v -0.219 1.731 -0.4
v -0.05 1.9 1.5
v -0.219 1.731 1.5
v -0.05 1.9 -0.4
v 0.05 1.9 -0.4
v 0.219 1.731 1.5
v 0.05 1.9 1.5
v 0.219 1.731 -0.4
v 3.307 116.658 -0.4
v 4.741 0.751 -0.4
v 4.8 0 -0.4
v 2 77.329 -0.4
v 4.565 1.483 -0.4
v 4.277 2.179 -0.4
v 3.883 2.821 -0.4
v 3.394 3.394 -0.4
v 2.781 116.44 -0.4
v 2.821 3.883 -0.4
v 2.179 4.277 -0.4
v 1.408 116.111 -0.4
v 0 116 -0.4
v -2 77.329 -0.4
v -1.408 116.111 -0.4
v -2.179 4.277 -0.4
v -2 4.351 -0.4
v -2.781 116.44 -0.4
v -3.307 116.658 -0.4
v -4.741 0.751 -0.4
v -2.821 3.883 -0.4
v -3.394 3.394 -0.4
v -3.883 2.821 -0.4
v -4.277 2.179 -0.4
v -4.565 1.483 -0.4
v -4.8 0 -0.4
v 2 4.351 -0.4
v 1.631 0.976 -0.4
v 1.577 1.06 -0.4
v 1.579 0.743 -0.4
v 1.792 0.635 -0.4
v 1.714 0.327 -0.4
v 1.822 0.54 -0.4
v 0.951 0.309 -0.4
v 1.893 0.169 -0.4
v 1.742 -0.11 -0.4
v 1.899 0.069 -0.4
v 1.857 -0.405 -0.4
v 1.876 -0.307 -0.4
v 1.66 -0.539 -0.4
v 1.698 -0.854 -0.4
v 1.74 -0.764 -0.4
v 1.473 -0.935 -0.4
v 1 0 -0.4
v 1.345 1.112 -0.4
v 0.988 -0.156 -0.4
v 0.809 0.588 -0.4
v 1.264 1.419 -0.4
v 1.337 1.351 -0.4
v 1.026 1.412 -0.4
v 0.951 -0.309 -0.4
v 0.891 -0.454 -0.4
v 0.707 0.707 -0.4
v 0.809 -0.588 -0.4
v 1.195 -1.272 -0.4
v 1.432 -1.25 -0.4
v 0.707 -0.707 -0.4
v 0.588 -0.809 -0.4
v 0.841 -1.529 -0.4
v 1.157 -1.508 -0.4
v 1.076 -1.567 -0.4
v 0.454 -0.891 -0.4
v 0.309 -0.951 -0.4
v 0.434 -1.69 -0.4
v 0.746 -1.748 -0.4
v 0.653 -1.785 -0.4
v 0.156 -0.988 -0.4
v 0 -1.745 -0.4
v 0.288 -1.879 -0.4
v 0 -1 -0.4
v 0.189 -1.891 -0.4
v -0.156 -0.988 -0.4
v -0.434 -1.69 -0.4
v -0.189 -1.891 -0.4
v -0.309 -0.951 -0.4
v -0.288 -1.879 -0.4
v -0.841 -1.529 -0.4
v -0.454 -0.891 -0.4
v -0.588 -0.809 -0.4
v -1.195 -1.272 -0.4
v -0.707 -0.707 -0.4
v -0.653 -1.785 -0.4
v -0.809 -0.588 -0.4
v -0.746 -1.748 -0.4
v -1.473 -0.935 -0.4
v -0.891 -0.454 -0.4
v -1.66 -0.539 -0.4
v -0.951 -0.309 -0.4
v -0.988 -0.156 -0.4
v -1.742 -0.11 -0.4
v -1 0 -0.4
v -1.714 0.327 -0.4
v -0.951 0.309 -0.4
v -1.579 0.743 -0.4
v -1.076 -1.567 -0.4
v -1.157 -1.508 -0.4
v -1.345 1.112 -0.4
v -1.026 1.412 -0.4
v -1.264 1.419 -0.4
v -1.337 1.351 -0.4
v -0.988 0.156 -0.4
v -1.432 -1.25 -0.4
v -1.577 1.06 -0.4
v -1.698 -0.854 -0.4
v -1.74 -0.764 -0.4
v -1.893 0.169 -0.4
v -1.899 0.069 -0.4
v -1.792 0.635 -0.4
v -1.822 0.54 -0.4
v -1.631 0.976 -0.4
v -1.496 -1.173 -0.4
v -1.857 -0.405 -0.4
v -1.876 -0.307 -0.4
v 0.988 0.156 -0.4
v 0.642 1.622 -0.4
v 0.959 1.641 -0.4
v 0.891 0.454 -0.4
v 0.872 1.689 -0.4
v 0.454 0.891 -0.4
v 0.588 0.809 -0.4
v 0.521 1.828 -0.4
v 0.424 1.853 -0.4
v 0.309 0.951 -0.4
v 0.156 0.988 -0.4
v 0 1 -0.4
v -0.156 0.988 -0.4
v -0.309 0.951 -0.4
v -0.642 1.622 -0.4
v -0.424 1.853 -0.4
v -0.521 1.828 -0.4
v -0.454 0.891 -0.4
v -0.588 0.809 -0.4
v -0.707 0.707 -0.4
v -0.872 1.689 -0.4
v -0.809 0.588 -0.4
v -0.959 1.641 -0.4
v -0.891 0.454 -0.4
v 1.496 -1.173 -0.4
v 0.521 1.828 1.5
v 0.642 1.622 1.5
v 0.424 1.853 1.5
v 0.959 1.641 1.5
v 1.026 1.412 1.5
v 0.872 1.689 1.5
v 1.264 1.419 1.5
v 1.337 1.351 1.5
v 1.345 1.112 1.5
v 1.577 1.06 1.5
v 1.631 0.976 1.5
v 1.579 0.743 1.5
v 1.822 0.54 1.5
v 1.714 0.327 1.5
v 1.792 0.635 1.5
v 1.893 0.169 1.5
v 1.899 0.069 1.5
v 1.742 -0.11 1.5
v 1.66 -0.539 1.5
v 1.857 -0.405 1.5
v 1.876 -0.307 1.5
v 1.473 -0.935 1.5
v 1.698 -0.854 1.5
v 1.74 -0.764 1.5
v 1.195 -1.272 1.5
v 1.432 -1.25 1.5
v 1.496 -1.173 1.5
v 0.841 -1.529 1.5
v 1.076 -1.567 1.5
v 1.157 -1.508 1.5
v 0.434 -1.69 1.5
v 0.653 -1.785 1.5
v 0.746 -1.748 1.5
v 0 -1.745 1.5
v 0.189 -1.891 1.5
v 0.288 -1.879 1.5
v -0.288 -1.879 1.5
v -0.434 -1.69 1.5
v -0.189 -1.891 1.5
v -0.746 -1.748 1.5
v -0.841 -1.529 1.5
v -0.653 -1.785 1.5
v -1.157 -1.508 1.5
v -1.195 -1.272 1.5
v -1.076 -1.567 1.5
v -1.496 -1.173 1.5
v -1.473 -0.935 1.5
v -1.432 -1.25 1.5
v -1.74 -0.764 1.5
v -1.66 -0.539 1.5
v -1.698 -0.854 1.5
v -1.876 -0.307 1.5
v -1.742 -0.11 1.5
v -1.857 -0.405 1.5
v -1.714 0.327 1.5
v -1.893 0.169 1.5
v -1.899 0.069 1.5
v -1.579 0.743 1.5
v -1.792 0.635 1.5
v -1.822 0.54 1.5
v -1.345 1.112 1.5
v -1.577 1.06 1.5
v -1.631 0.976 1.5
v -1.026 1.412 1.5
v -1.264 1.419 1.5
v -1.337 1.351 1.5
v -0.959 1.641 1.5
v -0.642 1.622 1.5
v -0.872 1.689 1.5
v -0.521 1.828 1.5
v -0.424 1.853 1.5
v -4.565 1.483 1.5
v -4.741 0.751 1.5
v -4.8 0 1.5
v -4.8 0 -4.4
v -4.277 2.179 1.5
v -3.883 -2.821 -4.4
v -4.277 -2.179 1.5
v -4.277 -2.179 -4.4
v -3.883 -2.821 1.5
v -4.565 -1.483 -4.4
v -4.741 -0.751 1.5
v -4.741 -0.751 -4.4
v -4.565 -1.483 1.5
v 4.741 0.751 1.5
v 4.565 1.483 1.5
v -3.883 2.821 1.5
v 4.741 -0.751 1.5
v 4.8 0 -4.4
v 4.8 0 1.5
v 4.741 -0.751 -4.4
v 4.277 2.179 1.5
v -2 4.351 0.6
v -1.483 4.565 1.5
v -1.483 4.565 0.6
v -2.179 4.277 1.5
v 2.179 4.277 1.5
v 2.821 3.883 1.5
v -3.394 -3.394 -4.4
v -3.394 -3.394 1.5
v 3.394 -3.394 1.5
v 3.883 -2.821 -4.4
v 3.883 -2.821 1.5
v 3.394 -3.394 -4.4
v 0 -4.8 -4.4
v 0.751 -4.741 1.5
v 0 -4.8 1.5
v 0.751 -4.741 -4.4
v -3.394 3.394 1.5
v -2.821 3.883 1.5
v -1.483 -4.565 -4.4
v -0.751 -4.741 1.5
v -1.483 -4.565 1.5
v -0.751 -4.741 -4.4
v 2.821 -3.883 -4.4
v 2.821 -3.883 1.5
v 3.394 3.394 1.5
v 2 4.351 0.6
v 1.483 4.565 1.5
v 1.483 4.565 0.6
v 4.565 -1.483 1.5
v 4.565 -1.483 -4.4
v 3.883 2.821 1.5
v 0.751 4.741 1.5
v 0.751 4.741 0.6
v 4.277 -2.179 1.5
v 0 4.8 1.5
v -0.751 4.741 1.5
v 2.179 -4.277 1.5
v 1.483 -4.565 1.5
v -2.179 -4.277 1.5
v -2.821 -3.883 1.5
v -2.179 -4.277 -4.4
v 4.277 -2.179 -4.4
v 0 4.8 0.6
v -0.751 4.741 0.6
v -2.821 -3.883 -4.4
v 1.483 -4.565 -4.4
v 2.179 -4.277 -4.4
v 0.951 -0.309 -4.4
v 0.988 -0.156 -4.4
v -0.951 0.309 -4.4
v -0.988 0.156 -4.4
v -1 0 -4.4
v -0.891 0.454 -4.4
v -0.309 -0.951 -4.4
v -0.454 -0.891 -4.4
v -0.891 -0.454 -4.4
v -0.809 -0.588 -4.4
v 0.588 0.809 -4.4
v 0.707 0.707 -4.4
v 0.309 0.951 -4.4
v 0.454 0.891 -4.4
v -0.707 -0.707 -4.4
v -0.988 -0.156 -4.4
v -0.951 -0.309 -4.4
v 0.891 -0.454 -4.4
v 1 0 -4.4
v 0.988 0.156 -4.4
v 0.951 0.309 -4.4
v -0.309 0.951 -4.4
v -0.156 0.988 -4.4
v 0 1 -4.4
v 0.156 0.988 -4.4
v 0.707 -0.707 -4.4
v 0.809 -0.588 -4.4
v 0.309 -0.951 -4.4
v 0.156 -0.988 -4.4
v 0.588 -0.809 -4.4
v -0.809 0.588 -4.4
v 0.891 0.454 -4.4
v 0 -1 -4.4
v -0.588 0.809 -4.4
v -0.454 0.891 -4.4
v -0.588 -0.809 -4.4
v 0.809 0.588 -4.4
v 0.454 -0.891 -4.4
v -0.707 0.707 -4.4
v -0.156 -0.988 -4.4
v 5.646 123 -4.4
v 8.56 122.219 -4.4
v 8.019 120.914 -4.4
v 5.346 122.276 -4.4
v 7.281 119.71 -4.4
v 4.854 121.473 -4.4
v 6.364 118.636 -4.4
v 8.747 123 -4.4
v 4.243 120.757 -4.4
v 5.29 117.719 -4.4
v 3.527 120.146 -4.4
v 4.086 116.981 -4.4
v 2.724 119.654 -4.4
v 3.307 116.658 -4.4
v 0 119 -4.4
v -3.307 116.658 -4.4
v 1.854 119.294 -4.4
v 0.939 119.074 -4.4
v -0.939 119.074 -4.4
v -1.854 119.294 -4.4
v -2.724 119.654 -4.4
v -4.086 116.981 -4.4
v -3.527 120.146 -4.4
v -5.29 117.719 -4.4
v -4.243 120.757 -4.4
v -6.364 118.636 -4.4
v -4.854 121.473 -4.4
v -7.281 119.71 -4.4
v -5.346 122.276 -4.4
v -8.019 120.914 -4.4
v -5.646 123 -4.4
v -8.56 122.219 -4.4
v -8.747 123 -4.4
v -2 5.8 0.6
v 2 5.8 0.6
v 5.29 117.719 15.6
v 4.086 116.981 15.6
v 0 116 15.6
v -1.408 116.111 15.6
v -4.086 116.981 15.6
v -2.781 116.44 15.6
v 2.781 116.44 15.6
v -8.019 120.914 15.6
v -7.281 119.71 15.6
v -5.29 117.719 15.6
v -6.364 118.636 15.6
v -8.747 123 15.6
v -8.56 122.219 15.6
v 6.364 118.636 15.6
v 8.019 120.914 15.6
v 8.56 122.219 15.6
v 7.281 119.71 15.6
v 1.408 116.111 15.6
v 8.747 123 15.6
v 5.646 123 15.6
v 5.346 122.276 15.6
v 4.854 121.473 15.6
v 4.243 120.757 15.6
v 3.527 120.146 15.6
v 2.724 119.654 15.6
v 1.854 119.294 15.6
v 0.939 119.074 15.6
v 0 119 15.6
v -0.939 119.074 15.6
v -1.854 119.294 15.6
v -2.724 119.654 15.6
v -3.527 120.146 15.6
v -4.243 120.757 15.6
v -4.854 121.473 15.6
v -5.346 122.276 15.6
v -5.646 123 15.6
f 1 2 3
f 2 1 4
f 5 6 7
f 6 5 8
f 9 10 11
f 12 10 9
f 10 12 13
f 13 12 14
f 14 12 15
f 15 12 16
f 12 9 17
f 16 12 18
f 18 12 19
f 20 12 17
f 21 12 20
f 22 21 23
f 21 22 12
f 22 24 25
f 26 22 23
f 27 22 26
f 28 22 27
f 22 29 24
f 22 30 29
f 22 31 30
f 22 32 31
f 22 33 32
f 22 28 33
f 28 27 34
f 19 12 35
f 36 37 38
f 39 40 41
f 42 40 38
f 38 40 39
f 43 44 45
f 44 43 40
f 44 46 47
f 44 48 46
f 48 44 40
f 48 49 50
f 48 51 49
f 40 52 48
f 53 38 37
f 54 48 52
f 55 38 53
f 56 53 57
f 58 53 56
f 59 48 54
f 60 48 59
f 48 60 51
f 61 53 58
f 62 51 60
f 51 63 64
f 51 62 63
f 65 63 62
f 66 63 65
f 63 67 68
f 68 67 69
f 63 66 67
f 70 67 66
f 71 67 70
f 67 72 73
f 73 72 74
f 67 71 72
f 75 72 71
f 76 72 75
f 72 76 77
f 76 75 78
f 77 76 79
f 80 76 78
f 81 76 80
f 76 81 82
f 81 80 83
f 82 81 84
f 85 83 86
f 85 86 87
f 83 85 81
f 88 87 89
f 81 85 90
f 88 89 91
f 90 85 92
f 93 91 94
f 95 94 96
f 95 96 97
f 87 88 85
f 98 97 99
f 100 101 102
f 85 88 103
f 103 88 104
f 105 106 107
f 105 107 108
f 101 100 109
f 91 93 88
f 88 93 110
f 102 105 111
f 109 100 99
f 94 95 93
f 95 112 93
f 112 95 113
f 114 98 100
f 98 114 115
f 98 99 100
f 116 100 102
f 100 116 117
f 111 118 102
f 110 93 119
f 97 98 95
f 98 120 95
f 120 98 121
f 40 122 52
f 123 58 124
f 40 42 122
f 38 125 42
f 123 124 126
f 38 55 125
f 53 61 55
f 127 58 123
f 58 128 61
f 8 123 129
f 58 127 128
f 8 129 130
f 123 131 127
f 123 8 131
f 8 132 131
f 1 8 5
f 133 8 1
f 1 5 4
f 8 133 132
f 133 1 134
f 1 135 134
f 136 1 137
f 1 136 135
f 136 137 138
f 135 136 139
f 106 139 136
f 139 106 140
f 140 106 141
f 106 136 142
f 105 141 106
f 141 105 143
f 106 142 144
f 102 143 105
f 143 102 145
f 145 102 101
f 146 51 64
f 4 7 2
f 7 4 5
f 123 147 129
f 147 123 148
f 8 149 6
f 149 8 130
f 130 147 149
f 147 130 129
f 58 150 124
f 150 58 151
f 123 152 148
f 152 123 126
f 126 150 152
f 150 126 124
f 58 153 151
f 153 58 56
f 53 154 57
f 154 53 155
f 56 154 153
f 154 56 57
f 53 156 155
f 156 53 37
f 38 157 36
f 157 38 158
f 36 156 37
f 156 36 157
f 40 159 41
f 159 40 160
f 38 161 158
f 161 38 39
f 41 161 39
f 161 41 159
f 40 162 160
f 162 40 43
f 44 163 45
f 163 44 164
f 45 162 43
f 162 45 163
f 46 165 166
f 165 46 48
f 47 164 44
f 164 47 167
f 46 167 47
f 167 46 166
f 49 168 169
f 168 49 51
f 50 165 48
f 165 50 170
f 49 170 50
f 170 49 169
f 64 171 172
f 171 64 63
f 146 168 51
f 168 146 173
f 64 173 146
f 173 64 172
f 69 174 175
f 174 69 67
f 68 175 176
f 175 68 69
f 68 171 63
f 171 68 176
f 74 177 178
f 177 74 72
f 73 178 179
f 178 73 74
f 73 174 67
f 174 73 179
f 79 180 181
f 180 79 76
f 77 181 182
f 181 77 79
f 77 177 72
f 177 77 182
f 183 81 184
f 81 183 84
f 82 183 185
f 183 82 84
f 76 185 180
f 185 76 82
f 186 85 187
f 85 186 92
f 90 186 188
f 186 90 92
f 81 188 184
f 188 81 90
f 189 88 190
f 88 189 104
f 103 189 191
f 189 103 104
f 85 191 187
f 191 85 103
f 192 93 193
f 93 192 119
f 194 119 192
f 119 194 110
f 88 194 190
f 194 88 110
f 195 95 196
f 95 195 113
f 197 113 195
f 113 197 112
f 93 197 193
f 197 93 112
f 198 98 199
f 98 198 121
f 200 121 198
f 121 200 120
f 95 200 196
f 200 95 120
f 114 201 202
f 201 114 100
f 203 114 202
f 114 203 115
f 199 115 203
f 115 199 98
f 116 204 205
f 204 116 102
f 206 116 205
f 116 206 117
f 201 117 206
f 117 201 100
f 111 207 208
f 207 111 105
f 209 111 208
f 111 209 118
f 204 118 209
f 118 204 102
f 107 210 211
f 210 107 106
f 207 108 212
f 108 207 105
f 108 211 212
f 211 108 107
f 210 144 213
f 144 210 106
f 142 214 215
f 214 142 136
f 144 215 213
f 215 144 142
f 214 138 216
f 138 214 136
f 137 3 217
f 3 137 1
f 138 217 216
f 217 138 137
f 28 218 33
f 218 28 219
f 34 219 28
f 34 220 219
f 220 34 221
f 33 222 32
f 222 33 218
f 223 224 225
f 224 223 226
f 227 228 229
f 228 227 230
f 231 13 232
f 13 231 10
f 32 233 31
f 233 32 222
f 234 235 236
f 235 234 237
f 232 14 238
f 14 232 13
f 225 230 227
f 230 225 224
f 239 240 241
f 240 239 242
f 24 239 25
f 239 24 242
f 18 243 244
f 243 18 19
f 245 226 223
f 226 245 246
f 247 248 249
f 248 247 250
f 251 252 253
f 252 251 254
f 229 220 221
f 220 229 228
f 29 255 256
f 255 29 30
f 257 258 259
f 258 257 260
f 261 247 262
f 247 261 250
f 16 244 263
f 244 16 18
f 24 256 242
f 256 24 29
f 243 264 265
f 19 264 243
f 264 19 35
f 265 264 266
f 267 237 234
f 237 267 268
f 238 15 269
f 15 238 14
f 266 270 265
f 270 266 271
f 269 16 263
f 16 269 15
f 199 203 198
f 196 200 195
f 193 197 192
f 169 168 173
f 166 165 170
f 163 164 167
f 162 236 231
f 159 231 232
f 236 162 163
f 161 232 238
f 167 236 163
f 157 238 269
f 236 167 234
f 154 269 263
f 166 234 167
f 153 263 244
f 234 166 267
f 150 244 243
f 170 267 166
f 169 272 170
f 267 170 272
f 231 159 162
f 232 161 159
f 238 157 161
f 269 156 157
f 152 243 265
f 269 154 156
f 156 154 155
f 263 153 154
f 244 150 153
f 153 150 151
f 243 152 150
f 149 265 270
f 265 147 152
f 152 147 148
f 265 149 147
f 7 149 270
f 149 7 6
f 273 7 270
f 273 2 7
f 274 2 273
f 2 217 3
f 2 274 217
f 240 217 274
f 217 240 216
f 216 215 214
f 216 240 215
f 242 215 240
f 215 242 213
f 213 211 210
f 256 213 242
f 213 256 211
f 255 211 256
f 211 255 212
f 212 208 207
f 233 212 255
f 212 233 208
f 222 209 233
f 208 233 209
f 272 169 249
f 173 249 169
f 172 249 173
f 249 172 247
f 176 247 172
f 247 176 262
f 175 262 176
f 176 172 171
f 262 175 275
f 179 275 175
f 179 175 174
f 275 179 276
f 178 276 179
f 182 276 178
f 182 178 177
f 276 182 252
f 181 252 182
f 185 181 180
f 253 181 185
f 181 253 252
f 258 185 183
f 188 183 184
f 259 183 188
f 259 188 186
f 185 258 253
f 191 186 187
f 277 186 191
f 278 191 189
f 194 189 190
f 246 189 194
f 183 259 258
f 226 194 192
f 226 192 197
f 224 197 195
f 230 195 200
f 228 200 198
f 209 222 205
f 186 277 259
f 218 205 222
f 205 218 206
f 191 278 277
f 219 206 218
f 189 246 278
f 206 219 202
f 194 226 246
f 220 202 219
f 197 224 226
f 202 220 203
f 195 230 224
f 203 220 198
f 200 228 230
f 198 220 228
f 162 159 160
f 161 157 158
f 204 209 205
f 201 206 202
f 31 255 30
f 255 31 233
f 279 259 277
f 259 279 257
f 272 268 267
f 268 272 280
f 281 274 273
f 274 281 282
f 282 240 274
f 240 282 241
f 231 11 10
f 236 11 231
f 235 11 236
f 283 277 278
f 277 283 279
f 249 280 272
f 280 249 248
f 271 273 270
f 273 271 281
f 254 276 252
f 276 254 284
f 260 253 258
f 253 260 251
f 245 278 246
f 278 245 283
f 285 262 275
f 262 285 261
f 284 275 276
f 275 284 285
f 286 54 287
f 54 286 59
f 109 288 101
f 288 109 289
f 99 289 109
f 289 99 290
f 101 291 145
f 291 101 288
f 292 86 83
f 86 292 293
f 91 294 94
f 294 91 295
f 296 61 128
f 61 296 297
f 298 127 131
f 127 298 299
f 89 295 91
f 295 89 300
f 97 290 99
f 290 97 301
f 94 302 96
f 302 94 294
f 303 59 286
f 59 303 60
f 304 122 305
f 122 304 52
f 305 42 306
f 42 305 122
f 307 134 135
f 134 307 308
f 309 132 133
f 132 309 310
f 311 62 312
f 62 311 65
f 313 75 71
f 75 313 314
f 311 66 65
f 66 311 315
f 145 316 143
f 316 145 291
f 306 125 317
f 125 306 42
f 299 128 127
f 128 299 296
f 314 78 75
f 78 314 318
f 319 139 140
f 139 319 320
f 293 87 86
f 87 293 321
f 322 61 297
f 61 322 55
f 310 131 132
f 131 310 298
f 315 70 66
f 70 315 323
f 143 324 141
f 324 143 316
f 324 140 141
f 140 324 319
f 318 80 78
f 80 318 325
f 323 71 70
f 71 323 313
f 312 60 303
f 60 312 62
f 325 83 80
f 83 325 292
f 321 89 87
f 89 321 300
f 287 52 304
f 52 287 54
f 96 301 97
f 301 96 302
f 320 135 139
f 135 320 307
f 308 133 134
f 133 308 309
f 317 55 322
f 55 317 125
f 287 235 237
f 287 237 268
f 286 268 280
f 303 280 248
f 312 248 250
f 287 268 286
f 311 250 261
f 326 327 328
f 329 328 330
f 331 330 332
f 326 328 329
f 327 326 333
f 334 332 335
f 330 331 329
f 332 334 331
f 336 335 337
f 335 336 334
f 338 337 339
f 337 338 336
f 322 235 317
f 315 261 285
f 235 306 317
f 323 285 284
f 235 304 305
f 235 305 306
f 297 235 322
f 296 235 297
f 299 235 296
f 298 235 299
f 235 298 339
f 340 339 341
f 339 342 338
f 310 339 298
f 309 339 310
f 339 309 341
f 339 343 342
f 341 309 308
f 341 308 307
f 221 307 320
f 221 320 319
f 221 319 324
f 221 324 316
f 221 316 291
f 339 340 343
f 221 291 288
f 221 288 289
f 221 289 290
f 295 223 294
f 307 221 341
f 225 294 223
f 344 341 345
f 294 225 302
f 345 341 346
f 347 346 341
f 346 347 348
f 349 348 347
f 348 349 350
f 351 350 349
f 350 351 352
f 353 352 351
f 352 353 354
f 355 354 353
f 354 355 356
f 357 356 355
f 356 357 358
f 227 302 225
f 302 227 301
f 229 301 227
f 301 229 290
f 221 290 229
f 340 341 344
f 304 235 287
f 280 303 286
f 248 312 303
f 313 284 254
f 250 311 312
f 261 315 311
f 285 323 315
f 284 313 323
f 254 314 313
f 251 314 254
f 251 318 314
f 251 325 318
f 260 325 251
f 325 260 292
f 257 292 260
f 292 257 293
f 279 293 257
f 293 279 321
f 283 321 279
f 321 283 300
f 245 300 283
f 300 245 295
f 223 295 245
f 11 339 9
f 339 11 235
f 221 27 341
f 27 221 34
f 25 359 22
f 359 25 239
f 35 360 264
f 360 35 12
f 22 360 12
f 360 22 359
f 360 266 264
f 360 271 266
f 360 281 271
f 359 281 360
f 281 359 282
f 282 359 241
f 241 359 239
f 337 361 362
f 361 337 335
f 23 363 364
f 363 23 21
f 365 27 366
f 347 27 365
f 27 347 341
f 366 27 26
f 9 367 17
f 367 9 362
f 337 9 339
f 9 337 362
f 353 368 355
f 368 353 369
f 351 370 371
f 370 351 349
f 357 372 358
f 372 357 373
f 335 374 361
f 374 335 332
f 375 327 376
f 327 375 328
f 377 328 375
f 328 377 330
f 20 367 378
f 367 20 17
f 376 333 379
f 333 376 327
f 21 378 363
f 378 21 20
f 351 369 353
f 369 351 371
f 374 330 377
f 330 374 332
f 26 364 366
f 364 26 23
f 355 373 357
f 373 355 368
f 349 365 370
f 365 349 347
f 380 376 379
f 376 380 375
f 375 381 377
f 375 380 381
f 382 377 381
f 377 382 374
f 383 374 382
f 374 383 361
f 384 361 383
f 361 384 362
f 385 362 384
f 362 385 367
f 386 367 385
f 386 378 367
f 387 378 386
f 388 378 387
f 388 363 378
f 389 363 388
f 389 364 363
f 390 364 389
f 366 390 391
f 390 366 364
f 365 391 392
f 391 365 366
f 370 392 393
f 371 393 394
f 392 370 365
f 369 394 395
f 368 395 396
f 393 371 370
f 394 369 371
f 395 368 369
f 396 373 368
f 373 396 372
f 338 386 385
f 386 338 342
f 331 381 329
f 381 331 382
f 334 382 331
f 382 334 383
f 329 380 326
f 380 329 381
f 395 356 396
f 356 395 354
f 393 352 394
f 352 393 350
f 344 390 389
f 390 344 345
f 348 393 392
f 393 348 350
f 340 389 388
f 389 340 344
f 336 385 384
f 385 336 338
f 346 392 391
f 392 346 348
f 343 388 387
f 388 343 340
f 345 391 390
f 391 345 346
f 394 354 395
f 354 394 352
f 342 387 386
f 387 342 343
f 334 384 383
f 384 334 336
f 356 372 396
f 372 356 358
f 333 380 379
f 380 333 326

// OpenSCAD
/**
 *  Parametric servo arm generator for OpenScad
 *  Générateur de palonnier de servo pour OpenScad
 *
 *  Copyright (c) 2012 Charles Rincheval.  All rights reserved.
 *
 *  This library is free software; you can redistribute it and/or
 *  modify it under the terms of the GNU Lesser General Public
 *  License as published by the Free Software Foundation; either
 *  version 2.1 of the License, or (at your option) any later version.
 *
 *  This library is distributed in the hope that it will be useful,
 *  but WITHOUT ANY WARRANTY; without even the implied warranty of
 *  MERCHANTABILITY or FITNESS FOR A PARTICULAR PURPOSE.  See the GNU
 *  Lesser General Public License for more details.
 *
 *  You should have received a copy of the GNU Lesser General Public
 *  License along with this library; if not, write to the Free Software
 *  Foundation, Inc., 51 Franklin St, Fifth Floor, Boston, MA  02110-1301  USA
 *
 *  Last update :
 *  https://github.com/hugokernel/OpenSCAD_ServoArms
 *
 *  http://www.digitalspirit.org/
 */



arm_length = 125;

translate([0,arm_length,-2.4-2]) difference(){
    union(){
        translate([0,-arm_length,+2.4+3.6]) demo();
        cylinder(r=9,h=20);
        //translate([-15,-20,0])cube([30,5,2]);
    }
    cylinder(r=6,h=20);
    translate([-9,-2,-0.1]) #cube([18,18,28]);
}

arm_count = 1; // [1,2,3,4,5,6,7,8]

//  Clear between arm head and servo head (PLA: 0.3, ABS 0.2)
SERVO_HEAD_CLEAR = 0.2; // [0.2,0.3,0.4,0.5]

$fn = 40 / 1;

/**
 *  Head / Tooth parameters
 *  Futaba 3F Standard Spline
 *  http://www.servocity.com/html/futaba_servo_splines.html
 *
 *  First array (head related) :
 *  0. Head external diameter
 *  1. Head heigth
 *  2. Head thickness
 *  3. Head screw diameter
 *
 *  Second array (tooth related) :
 *  0. Tooth count
 *  1. Tooth height
 *  2. Tooth length
 *  3. Tooth width
 */
FUTABA_3F_SPLINE = [
    [3.4, 2, 3.1, 2],
    [25, 0.3, 0.7, 0.1]
];

module servo_futaba_3f(length, count) {
    servo_arm(FUTABA_3F_SPLINE, [length, count]);
}

/**
 *  If you want to support a new servo, juste add a new spline definition array
 *  and a module named like servo_XXX_YYY where XXX is servo brand and YYY is the
 *  connection type (3f) or the servo type (s3003)
 */

module servo_standard(length, count) {
    servo_futaba_3f(length, count);
}

/**
 *  Tooth
 *
 *    |<-w->|
 *    |_____|___
 *    /     \  ^h
 *  _/       \_v
 *   |<--l-->|
 *
 *  - tooth length (l)
 *  - tooth width (w)
 *  - tooth height (h)
 *  - height
 *
 */
module servo_head_tooth(length, width, height, head_height) {
    linear_extrude(height = head_height) {
        polygon([[-length / 2, 0], [-width / 2, height], [width / 2, height], [length / 2,0]]);
    }
}

/**
 *  Servo head
 */
module servo_head(params, clear = SERVO_HEAD_CLEAR) {

    head = params[0];
    tooth = params[1];

    head_diameter = head[0];
    head_heigth = head[1];

    tooth_count = tooth[0];
    tooth_height = tooth[1];
    tooth_length = tooth[2];
    tooth_width = tooth[3];

    % cylinder(r = head_diameter / 2, h = head_heigth + 1);

    cylinder(r = head_diameter / 2 - tooth_height + 0.03 + clear, h = head_heigth);

    for (i = [0 : tooth_count]) {
        rotate([0, 0, i * (360 / tooth_count)]) {
            translate([0, head_diameter / 2 - tooth_height + clear, 0]) {
                servo_head_tooth(tooth_length, tooth_width, tooth_height, head_heigth);
            }
        }
    }
}

/**
 *  Servo hold
 *  - Head / Tooth parameters
 *  - Arms params (length and count)
 */
module servo_arm(params, arms) {

    head = params[0];
    tooth = params[1];

    head_diameter = head[0];
    head_heigth = head[1];
    head_thickness = head[2];
    head_screw_diameter = head[3];

    tooth_length = tooth[2];
    tooth_width = tooth[3];

    arm_length = arms[0];
    arm_count = arms[1];

    /**
     *  Servo arm
     *  - length is from center to last hole
     */
    module arm(tooth_length, tooth_width, head_height, head_heigth, hole_count = 1) {

        arm_screw_diameter = 2;

        difference() {
            union() {
                cylinder(r = tooth_width / 2, h = head_heigth);

                linear_extrude(height = head_heigth) {
                    polygon([
                        [-tooth_width / 2, 0], [-tooth_width / 3, tooth_length],
                        [tooth_width / 3, tooth_length], [tooth_width / 2, 0]
                    ]);
                }

                translate([0, tooth_length, 0]) {
                    cylinder(r = tooth_width / 3, h = head_heigth);
                }

                if (tooth_length >= 12) {
                    translate([-head_heigth / 2 + 2 +2, 3.8, -4]) {
                        rotate([90, 0, 0]) {
                            rotate([0, -90, 0]) {
                                linear_extrude(height = head_heigth) {
                                    polygon([
                                        [-tooth_length / 1.7, 4], [0, 4], [0, - head_height + 5],
                                        [-2, - head_height + 5]
                                    ]);
                                }
                            }
                        }
                    }
                }
            }

            // Hole
            for (i = [0 : hole_count - 1]) {
                //translate([0, length - (length / hole_count * i), -1]) {
                translate([0, tooth_length - (4 * i), -1]) {
                    cylinder(r = arm_screw_diameter / 2, h = 10);
                }
            }

            cylinder(r = head_screw_diameter / 2, h = 10);
        }
    }

    difference() {
        translate([0, 0, 0.1]) {
            cylinder(r = head_diameter / 2 + head_thickness, h = head_heigth + 1);
        }

        cylinder(r = head_screw_diameter / 2, h = 10);

        servo_head(params);
    }

    arm_thickness = head_thickness;

    // Arm
    translate([0, 0, head_heigth]) {
        for (i = [0 : arm_count - 1]) {
            rotate([0, 0, i * (360 / arm_count)]) {
                arm(arm_length, head_diameter + arm_thickness * 2, head_heigth, 4);
            }
        }
    }
}

module demo() {
    rotate([0, 180, 0])
        servo_standard(arm_length, arm_count);
}
